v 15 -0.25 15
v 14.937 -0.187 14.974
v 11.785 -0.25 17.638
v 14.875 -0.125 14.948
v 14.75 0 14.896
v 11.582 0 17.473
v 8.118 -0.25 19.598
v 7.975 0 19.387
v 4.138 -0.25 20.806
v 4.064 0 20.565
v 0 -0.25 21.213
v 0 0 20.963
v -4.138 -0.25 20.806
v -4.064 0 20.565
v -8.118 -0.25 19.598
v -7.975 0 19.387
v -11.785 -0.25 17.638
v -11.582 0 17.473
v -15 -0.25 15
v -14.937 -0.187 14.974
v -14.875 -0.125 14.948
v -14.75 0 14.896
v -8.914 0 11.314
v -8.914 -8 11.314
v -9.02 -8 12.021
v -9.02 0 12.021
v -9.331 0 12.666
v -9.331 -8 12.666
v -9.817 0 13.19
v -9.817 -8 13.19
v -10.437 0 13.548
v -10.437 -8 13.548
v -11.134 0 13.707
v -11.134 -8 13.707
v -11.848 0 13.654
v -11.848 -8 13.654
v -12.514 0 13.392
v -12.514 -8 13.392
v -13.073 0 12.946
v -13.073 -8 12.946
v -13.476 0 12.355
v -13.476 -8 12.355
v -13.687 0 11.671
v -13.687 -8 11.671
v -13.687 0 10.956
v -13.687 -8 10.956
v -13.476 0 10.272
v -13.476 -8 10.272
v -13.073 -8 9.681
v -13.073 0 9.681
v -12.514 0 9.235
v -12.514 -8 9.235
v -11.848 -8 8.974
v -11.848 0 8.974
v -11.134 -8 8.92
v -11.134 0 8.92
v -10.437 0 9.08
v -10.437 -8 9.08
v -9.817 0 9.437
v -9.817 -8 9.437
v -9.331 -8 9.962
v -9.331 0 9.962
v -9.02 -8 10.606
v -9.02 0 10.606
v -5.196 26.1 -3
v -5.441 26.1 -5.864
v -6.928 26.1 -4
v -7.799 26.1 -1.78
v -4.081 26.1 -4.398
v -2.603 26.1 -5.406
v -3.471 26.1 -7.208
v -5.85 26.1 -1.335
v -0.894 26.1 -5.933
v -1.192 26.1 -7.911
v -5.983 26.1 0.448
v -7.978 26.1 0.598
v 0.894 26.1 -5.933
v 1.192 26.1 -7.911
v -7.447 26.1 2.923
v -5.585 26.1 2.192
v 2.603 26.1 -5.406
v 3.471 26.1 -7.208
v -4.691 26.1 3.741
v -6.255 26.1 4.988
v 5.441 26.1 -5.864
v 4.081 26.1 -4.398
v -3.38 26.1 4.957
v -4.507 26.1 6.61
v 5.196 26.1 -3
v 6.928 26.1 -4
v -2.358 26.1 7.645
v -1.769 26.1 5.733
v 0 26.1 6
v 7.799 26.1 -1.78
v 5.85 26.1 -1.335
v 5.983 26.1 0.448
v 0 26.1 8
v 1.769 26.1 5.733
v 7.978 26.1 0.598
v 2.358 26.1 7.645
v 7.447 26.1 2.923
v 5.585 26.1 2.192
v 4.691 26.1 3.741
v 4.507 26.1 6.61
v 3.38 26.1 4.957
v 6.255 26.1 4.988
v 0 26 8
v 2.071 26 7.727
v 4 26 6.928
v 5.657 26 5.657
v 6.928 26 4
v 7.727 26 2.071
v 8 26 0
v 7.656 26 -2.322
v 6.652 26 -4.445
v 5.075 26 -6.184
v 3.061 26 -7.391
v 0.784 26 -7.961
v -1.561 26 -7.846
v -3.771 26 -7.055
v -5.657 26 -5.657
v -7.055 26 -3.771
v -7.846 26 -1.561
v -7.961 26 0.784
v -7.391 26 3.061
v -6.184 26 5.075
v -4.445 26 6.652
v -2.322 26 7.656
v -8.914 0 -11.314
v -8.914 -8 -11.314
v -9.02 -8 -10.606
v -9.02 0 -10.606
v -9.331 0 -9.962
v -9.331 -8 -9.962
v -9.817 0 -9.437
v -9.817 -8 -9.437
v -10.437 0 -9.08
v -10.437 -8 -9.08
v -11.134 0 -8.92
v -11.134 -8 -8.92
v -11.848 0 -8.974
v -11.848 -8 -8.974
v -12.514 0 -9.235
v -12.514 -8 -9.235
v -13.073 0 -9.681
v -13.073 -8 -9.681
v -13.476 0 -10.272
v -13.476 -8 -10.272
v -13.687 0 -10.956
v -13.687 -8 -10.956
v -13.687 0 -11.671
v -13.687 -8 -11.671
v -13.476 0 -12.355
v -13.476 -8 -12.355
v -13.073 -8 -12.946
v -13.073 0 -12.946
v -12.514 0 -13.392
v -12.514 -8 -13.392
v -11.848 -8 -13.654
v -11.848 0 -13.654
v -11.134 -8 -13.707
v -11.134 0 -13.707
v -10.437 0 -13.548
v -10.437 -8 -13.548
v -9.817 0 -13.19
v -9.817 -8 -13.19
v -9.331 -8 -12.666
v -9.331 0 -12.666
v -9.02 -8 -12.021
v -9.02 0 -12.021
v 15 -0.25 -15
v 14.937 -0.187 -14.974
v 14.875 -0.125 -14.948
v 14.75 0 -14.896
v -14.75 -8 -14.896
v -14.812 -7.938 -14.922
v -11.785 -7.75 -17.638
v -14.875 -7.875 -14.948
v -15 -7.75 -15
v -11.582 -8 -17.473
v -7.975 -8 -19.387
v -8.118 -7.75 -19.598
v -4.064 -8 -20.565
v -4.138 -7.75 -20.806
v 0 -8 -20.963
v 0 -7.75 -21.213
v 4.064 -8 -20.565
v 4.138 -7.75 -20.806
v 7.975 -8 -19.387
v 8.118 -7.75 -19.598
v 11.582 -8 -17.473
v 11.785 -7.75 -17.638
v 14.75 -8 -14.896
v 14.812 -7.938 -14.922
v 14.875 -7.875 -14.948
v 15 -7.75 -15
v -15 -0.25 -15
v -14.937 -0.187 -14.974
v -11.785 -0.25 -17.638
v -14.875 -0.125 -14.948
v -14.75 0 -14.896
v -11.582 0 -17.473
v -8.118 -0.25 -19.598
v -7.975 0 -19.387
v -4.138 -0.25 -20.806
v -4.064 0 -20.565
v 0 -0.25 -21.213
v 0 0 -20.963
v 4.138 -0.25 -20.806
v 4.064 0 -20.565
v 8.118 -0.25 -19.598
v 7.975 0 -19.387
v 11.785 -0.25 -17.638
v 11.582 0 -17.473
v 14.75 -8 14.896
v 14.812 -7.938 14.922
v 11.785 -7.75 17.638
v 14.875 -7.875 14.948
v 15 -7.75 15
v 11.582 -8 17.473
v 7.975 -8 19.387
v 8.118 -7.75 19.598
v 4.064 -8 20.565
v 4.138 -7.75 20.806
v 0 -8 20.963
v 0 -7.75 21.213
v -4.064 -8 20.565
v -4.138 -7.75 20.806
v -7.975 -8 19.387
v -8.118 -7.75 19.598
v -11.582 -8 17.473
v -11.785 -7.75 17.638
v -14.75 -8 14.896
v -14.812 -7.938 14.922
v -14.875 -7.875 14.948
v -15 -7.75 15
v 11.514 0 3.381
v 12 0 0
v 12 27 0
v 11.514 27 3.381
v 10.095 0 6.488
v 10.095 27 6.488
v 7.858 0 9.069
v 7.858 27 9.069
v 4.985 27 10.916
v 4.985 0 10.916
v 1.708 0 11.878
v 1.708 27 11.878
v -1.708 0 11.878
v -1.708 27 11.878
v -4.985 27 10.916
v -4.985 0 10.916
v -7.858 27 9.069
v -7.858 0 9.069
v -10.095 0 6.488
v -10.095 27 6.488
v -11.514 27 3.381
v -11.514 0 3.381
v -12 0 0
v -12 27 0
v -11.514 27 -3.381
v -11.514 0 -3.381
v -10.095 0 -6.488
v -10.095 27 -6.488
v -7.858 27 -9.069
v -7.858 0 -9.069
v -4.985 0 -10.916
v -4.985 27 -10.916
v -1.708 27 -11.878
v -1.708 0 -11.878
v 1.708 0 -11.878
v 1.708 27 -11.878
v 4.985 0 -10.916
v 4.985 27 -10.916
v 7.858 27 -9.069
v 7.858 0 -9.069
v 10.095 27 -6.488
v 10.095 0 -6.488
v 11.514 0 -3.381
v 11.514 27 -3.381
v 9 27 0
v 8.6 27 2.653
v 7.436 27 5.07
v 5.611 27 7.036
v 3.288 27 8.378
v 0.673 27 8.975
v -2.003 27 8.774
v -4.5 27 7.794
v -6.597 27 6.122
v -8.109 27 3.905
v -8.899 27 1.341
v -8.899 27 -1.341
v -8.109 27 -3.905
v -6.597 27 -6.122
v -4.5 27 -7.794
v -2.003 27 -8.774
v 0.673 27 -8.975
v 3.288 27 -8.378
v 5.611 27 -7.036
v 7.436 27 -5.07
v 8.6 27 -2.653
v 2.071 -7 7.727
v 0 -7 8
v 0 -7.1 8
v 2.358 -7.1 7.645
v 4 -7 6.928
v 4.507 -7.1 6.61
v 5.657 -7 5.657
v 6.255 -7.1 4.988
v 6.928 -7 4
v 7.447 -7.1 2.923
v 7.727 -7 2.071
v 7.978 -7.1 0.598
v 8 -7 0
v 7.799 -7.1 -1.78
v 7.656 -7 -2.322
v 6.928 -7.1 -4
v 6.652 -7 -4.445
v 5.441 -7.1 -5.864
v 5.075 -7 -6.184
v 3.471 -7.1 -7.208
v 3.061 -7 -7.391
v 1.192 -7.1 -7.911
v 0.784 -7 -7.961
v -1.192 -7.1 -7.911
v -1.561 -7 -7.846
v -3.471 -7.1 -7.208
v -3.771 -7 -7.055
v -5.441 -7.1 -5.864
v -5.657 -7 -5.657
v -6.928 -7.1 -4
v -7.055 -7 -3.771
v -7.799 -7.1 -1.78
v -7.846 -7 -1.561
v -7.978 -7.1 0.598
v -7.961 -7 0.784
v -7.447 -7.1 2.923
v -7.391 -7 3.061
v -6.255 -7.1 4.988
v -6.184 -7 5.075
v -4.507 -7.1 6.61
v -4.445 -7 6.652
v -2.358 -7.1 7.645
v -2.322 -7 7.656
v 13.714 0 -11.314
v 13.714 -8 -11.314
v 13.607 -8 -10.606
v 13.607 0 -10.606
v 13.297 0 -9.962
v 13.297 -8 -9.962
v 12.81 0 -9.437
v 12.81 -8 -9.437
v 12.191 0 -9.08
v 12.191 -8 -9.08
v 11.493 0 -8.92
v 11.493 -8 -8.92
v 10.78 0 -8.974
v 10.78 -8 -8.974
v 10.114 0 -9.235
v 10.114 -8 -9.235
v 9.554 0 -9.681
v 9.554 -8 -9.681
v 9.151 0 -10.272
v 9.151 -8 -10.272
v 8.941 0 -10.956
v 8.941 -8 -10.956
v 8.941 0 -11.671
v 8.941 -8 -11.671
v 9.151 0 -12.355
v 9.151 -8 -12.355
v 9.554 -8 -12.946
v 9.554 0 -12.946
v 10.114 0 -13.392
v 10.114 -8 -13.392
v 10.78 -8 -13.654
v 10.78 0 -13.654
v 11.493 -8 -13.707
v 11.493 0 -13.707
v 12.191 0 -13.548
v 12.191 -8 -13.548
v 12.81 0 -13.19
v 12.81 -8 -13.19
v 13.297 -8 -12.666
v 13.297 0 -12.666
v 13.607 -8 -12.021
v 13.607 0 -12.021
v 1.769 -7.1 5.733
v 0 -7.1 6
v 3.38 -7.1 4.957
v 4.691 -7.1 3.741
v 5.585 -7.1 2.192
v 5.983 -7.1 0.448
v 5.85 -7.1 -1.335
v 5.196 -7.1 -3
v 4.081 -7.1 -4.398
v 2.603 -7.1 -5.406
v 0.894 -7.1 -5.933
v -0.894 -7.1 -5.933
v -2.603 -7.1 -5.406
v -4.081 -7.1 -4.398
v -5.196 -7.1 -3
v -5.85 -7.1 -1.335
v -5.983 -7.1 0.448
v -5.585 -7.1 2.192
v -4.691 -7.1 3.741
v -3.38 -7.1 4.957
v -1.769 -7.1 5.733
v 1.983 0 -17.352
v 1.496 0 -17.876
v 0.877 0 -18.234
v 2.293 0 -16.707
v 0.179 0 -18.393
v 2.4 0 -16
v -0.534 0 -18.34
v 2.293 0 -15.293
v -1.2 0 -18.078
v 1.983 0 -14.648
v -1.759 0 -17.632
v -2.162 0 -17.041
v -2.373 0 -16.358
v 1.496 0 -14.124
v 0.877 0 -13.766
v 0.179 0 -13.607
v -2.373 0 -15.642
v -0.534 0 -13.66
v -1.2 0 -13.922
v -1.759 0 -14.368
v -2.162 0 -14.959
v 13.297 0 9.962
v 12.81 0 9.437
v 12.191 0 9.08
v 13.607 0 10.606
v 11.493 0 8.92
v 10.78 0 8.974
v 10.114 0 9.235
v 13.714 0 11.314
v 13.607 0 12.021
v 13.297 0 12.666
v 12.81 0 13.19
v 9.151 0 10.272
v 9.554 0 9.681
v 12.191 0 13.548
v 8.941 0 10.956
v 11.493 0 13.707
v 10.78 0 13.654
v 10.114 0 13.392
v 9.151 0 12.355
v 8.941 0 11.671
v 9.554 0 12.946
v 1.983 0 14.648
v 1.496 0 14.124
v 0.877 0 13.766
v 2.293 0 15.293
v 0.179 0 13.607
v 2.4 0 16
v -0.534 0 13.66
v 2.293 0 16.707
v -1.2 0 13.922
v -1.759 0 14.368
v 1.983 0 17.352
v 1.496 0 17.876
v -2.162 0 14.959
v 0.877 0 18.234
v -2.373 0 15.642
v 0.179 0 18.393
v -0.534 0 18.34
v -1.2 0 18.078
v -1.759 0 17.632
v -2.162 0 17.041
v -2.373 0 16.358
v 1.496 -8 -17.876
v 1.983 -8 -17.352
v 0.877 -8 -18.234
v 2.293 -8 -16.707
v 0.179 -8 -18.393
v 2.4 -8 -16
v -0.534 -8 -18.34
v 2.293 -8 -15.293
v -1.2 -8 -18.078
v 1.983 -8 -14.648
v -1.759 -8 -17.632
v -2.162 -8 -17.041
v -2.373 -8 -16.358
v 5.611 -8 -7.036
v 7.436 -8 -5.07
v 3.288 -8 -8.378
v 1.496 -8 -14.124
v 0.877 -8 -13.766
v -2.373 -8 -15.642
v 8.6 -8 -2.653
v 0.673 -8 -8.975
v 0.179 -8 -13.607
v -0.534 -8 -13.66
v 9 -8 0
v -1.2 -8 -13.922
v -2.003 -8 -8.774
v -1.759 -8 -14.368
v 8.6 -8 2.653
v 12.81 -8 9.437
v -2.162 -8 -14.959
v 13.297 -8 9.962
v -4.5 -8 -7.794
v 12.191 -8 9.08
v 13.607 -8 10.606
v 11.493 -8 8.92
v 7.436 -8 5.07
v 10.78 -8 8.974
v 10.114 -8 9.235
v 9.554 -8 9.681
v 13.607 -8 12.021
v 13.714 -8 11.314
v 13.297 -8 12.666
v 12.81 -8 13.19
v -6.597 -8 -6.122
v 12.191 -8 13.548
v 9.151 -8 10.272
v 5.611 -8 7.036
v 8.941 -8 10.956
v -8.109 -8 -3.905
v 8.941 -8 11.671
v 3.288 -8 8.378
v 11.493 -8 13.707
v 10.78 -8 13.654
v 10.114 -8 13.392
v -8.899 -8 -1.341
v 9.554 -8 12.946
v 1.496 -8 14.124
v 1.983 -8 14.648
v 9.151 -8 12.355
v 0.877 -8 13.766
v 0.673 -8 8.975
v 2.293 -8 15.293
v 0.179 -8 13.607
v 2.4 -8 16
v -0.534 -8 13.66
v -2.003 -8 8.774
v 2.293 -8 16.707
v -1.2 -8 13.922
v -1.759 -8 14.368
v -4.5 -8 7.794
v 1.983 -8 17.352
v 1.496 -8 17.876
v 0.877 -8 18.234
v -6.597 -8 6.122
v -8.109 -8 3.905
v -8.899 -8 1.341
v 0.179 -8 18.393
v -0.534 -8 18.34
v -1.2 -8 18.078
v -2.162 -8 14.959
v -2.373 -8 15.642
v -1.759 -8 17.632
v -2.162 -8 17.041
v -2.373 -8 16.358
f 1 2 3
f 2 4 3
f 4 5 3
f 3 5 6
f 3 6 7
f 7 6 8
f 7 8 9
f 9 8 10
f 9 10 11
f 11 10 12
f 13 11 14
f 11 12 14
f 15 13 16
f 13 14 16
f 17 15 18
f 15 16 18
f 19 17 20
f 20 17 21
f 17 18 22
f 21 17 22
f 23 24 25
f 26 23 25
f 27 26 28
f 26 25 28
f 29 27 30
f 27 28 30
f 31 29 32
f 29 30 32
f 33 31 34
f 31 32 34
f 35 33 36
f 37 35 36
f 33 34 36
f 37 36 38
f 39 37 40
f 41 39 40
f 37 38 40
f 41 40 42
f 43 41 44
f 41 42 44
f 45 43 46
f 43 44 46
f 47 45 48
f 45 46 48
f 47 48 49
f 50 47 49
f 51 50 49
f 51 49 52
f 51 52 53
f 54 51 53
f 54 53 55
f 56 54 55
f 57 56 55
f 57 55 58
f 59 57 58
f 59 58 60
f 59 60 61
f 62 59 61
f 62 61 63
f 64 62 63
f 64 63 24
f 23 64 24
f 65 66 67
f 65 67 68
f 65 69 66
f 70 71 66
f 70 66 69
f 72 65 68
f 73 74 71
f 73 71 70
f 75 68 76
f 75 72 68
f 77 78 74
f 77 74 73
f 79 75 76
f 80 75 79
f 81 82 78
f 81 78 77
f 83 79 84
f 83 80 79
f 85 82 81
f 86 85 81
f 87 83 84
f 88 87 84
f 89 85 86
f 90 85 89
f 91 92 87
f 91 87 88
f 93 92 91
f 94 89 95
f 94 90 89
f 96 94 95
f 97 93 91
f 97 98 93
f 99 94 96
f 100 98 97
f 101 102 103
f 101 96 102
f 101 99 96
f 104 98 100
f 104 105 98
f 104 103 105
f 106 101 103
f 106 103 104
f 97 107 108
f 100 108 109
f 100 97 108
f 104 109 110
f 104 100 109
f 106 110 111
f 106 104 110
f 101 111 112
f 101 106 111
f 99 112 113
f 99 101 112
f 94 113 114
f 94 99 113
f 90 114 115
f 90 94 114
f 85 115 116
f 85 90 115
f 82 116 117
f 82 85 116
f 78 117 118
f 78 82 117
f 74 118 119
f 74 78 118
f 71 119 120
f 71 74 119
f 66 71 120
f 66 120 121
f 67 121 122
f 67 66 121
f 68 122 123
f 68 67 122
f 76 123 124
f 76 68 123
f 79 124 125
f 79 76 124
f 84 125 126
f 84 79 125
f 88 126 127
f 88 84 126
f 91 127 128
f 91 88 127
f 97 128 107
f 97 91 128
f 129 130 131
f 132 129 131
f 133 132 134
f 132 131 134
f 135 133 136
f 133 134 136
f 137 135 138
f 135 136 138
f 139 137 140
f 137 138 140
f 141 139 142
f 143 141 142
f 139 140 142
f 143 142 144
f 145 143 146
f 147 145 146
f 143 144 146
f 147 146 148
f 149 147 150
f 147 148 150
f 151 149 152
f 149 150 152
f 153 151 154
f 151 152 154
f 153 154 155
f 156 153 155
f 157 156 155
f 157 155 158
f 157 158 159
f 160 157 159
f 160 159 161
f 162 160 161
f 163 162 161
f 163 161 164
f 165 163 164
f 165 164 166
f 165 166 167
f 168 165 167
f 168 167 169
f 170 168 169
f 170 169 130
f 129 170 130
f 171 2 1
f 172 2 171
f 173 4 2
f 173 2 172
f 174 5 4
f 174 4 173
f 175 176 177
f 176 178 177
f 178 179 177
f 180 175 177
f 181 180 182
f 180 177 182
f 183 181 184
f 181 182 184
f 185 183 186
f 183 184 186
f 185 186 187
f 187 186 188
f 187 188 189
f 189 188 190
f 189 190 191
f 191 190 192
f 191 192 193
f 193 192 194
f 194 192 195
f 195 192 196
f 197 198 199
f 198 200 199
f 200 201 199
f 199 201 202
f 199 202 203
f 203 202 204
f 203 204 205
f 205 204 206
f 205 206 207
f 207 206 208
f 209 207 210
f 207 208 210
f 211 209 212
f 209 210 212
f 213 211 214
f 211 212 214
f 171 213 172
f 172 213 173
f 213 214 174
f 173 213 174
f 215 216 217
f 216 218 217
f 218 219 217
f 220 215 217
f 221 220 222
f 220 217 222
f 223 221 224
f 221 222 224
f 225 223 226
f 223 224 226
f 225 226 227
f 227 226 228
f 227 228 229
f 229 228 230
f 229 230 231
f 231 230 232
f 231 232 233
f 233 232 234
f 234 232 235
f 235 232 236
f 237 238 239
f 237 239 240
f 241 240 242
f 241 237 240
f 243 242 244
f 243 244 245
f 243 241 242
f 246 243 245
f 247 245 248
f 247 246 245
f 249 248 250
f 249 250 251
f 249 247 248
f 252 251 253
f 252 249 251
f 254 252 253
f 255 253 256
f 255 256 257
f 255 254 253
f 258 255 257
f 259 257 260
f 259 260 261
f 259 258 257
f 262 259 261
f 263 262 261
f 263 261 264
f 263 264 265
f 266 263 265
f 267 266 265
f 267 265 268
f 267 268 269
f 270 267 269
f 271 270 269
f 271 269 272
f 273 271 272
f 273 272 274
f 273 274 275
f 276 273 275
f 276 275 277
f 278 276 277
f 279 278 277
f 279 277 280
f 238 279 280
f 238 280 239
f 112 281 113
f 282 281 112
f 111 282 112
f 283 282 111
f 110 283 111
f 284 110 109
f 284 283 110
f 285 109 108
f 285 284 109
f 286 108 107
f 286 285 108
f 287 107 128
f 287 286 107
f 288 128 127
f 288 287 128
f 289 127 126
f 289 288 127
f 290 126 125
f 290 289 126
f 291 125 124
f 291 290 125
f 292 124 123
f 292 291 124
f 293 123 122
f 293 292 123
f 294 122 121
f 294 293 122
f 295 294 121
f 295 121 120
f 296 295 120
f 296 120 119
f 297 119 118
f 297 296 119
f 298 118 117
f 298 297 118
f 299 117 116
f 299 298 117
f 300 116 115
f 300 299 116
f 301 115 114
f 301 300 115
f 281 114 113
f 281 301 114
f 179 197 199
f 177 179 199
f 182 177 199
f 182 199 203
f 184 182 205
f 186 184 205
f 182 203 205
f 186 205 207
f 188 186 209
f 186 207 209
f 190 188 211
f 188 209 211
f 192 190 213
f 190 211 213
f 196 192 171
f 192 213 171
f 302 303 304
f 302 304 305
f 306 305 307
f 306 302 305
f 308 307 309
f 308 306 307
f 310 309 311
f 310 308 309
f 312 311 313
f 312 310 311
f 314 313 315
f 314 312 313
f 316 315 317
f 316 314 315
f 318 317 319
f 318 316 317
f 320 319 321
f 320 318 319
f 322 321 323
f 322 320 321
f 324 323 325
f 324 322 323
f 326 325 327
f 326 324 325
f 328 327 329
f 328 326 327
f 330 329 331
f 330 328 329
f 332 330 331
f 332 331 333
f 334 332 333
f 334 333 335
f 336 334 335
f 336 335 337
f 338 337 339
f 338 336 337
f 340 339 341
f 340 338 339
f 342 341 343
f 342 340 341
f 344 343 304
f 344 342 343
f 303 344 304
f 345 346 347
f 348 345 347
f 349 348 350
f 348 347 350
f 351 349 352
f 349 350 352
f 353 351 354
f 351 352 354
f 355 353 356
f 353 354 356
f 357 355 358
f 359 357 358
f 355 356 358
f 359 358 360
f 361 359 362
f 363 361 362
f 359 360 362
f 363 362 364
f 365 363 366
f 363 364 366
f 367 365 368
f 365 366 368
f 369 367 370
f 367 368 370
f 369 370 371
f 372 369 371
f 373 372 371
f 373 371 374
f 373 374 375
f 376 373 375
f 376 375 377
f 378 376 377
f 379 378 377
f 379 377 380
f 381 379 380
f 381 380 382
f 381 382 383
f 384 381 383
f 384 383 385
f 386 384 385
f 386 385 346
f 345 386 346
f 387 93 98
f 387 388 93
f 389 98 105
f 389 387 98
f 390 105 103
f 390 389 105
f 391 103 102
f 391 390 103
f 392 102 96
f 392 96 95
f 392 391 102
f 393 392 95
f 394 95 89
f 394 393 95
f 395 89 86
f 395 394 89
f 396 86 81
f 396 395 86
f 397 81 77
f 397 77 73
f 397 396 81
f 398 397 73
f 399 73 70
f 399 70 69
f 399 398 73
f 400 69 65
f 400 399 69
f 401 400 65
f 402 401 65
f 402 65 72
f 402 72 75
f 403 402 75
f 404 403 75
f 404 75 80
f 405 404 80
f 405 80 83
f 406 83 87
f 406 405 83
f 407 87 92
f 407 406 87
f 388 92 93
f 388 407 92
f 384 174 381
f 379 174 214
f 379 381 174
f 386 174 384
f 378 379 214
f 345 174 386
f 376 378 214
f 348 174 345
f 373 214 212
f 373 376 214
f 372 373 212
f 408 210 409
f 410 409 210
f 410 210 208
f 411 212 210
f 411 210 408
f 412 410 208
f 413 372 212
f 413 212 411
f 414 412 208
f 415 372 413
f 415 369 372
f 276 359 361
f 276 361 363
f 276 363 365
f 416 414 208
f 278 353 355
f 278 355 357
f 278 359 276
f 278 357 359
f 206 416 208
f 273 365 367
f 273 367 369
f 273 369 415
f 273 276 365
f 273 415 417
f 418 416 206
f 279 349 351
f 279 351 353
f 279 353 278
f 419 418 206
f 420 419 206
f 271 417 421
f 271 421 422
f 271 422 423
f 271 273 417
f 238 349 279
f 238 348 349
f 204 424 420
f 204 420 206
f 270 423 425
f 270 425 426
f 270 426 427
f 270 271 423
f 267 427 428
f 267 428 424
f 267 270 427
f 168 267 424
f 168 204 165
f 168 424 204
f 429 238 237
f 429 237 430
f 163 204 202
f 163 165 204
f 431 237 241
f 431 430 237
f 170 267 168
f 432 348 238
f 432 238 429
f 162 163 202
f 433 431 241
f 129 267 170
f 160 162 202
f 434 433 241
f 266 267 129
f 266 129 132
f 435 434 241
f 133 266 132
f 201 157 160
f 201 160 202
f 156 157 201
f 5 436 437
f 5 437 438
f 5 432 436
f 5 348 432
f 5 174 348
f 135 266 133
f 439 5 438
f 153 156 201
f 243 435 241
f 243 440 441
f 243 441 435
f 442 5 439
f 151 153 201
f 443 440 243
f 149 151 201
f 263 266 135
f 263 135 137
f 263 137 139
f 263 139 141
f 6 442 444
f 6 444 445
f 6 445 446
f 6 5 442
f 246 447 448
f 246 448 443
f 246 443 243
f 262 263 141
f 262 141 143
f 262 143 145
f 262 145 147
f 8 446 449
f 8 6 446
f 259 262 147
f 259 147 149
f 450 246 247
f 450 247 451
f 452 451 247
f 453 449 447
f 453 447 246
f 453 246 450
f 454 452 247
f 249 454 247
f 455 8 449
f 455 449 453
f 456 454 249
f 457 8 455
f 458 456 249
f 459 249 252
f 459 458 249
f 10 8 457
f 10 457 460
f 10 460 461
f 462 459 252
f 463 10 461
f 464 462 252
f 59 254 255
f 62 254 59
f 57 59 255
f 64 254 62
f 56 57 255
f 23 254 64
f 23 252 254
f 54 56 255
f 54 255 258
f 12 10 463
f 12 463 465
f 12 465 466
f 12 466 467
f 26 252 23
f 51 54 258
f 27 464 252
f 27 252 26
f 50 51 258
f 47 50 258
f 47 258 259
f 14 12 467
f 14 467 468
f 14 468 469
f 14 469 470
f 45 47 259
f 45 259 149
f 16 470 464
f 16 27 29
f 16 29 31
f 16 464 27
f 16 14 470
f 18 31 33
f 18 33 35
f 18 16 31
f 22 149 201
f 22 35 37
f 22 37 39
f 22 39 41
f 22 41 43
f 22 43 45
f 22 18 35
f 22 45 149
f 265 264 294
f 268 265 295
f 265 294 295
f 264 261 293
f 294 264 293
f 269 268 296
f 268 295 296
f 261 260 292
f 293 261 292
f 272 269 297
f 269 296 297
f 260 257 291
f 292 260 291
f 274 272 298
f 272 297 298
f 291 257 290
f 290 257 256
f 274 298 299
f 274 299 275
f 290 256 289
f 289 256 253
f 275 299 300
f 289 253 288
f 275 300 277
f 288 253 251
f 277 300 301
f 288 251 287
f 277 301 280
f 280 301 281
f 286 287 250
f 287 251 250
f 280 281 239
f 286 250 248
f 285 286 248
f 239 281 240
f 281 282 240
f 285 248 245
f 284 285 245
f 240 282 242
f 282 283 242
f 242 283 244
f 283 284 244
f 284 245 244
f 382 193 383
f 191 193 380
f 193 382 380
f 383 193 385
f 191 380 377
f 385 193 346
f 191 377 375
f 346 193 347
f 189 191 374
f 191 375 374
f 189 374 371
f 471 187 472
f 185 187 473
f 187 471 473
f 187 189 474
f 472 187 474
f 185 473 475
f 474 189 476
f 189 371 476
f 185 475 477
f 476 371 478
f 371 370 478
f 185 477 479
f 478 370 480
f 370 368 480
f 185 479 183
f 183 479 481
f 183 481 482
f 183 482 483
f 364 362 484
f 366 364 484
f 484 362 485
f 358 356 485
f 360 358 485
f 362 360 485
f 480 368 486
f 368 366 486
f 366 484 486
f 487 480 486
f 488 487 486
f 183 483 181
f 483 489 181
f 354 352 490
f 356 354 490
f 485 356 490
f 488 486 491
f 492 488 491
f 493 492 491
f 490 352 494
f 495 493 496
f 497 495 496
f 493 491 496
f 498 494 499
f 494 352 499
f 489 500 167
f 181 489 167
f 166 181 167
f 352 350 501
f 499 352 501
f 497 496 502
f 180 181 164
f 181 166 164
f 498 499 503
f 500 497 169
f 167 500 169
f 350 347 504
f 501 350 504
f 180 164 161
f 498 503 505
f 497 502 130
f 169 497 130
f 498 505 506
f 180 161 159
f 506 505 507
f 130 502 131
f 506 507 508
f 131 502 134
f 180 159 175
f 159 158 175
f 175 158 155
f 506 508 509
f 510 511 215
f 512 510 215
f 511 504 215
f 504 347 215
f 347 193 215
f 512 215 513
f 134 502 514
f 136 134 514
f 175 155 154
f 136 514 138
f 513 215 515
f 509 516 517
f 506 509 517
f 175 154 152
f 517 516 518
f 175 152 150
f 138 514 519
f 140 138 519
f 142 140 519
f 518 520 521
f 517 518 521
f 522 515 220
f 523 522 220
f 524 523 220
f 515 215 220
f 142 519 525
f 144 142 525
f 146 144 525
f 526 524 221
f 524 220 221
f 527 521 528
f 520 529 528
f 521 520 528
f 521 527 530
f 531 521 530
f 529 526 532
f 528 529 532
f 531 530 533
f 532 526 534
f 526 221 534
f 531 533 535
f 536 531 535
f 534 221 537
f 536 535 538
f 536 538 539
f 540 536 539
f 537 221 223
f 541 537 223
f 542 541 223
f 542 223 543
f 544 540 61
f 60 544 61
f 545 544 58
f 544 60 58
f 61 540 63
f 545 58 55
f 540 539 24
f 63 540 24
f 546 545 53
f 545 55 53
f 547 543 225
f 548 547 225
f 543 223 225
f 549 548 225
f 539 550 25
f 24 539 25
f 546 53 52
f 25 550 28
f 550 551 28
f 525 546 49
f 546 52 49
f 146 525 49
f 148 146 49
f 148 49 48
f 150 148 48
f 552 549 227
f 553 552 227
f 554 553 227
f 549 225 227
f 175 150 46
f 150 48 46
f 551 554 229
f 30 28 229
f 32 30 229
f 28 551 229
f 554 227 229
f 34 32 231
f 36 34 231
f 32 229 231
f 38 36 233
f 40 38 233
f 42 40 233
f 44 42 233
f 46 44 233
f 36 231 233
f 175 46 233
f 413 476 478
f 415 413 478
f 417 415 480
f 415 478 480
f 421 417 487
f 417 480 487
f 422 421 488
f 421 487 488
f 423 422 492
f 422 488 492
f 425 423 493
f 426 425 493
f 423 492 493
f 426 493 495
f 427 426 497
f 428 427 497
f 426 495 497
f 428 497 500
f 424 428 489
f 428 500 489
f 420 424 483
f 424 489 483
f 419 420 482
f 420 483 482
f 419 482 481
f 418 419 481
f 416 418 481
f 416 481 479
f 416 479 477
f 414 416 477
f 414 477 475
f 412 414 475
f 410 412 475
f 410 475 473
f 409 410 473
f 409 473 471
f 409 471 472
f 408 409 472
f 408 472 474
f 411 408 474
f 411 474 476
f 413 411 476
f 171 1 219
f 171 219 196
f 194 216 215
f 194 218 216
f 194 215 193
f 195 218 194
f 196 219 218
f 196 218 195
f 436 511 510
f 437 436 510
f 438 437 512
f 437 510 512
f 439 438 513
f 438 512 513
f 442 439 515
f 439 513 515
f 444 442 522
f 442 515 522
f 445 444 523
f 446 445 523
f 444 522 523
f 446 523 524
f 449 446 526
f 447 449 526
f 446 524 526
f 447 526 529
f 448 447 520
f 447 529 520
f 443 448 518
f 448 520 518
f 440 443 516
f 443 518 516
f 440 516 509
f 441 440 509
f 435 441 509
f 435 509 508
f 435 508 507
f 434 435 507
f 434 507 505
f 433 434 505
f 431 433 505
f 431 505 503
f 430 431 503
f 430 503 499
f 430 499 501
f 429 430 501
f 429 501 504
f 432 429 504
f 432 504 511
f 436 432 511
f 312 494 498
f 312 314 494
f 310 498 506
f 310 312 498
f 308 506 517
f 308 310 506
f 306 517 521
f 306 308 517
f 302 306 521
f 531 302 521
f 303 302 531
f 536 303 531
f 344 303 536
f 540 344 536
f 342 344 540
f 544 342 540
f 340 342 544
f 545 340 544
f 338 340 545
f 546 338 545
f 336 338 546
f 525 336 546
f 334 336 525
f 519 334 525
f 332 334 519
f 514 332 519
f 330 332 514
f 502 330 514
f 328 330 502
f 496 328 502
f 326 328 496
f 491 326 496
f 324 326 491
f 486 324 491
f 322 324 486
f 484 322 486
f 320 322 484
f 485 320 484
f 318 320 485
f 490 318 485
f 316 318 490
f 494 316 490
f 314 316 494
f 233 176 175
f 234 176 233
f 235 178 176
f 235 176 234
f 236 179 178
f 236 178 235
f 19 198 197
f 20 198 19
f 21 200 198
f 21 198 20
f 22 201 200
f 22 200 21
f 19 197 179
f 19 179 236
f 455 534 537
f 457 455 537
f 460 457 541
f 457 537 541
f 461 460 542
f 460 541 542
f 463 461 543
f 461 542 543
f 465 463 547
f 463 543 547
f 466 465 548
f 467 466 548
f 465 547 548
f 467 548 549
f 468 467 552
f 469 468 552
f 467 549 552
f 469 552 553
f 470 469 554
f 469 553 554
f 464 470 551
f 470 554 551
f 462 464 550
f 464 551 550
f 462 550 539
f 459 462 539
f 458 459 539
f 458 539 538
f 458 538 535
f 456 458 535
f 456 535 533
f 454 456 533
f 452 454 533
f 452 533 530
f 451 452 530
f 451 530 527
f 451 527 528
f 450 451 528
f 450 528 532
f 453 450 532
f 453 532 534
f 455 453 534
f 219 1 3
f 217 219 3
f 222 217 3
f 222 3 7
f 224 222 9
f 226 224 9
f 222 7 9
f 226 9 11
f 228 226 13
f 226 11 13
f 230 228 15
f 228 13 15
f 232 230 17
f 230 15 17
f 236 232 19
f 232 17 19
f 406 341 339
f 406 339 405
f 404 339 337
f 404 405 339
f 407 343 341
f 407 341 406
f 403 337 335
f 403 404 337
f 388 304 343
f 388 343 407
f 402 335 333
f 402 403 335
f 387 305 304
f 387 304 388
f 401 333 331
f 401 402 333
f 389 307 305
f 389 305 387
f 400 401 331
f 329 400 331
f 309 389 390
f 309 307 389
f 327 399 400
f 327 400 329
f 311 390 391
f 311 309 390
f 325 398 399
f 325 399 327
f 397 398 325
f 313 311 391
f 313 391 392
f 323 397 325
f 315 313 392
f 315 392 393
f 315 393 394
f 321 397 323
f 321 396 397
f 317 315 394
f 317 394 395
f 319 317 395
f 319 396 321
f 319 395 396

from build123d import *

# Parameters (mm, degrees)
SKETCH_R        = 8
PAD_DEPTH       = 8
SKETCH001_R     = 2.4
POCKET_DEPTH    = 8.001
SKETCH002_R     = 12
SKETCH002_R_2   = 8
PAD001_DEPTH    = 35
CHAMFER_SIZE    = 0.25
CHAMFER001_SIZE = 1
CHAMFER002_SIZE = 1


with BuildPart() as housing_inner:
    # Sketch003 → Revolution (revolve)
    with BuildSketch(Plane.YZ):
        Polygon((-7.1, 6), (-7.1, 8), (-2.1, 8), (-2.1, 9), (21.1, 9), (21.1, 8), (26.1, 8), (26.1, 6), align=None)
    revolve(axis=Axis((0, 0, 0), (0, 1, 0)))


with BuildPart() as ballnut:
    # Sketch → Pad (new body)
    with BuildSketch(Plane.XZ):
        with BuildLine():
            Line((15, 15), (15, -15))
            ThreePointArc((-15, -15), (0, -21.213203), (15, -15))
            Line((-15, -15), (-15, 15))
            ThreePointArc((15, 15), (0, 21.213203), (-15, 15))
        make_face()
        Circle(SKETCH_R, mode=Mode.SUBTRACT)
    extrude(amount=PAD_DEPTH)

    # Sketch001 → Pocket (cut, through all)
    with BuildSketch(Plane.XZ.offset(8)):
        with Locations((-11.313708, 11.313708)):
            Circle(SKETCH001_R)
        with Locations((0, 16)):
            Circle(SKETCH001_R)
        with Locations((11.313708, 11.313708)):
            Circle(SKETCH001_R)
        with Locations((11.313708, -11.313708)):
            Circle(SKETCH001_R)
        with Locations((0, -16)):
            Circle(SKETCH001_R)
        with Locations((-11.313708, -11.313708)):
            Circle(SKETCH001_R)
    extrude(amount=-POCKET_DEPTH, mode=Mode.SUBTRACT)

    # Sketch002 → Pad001 (new body)
    with BuildSketch(Plane.XZ.offset(8)):
        Circle(SKETCH002_R)
        Circle(SKETCH002_R_2, mode=Mode.SUBTRACT)
    extrude(amount=-PAD001_DEPTH)

    # Chamfer
    chamfer_edges = [ballnut.edges().sort_by_distance(p)[0] for p in [
        (0, -8, 21.213203),
        (0, 0, 21.213203),
        (15, 0, 0),
        (15, -8, 0),
        (0, 0, -21.213203),
        (0, -8, -21.213203),
        (-15, -8, 0),
        (-15, 0, 0),
    ]]
    chamfer(chamfer_edges, length=CHAMFER_SIZE)

    # Chamfer001
    chamfer001_edges = [ballnut.edges().sort_by_distance(p)[0] for p in [
        (-8, -8, 0),
    ]]
    chamfer(chamfer001_edges, length=CHAMFER001_SIZE)

    # Chamfer002
    chamfer002_edges = [ballnut.edges().sort_by_distance(p)[0] for p in [
        (-8, 27, 0),
    ]]
    chamfer(chamfer002_edges, length=CHAMFER002_SIZE)

    # Fusion: union housing-inner
    add(housing_inner.part)


solid = ballnut.part
